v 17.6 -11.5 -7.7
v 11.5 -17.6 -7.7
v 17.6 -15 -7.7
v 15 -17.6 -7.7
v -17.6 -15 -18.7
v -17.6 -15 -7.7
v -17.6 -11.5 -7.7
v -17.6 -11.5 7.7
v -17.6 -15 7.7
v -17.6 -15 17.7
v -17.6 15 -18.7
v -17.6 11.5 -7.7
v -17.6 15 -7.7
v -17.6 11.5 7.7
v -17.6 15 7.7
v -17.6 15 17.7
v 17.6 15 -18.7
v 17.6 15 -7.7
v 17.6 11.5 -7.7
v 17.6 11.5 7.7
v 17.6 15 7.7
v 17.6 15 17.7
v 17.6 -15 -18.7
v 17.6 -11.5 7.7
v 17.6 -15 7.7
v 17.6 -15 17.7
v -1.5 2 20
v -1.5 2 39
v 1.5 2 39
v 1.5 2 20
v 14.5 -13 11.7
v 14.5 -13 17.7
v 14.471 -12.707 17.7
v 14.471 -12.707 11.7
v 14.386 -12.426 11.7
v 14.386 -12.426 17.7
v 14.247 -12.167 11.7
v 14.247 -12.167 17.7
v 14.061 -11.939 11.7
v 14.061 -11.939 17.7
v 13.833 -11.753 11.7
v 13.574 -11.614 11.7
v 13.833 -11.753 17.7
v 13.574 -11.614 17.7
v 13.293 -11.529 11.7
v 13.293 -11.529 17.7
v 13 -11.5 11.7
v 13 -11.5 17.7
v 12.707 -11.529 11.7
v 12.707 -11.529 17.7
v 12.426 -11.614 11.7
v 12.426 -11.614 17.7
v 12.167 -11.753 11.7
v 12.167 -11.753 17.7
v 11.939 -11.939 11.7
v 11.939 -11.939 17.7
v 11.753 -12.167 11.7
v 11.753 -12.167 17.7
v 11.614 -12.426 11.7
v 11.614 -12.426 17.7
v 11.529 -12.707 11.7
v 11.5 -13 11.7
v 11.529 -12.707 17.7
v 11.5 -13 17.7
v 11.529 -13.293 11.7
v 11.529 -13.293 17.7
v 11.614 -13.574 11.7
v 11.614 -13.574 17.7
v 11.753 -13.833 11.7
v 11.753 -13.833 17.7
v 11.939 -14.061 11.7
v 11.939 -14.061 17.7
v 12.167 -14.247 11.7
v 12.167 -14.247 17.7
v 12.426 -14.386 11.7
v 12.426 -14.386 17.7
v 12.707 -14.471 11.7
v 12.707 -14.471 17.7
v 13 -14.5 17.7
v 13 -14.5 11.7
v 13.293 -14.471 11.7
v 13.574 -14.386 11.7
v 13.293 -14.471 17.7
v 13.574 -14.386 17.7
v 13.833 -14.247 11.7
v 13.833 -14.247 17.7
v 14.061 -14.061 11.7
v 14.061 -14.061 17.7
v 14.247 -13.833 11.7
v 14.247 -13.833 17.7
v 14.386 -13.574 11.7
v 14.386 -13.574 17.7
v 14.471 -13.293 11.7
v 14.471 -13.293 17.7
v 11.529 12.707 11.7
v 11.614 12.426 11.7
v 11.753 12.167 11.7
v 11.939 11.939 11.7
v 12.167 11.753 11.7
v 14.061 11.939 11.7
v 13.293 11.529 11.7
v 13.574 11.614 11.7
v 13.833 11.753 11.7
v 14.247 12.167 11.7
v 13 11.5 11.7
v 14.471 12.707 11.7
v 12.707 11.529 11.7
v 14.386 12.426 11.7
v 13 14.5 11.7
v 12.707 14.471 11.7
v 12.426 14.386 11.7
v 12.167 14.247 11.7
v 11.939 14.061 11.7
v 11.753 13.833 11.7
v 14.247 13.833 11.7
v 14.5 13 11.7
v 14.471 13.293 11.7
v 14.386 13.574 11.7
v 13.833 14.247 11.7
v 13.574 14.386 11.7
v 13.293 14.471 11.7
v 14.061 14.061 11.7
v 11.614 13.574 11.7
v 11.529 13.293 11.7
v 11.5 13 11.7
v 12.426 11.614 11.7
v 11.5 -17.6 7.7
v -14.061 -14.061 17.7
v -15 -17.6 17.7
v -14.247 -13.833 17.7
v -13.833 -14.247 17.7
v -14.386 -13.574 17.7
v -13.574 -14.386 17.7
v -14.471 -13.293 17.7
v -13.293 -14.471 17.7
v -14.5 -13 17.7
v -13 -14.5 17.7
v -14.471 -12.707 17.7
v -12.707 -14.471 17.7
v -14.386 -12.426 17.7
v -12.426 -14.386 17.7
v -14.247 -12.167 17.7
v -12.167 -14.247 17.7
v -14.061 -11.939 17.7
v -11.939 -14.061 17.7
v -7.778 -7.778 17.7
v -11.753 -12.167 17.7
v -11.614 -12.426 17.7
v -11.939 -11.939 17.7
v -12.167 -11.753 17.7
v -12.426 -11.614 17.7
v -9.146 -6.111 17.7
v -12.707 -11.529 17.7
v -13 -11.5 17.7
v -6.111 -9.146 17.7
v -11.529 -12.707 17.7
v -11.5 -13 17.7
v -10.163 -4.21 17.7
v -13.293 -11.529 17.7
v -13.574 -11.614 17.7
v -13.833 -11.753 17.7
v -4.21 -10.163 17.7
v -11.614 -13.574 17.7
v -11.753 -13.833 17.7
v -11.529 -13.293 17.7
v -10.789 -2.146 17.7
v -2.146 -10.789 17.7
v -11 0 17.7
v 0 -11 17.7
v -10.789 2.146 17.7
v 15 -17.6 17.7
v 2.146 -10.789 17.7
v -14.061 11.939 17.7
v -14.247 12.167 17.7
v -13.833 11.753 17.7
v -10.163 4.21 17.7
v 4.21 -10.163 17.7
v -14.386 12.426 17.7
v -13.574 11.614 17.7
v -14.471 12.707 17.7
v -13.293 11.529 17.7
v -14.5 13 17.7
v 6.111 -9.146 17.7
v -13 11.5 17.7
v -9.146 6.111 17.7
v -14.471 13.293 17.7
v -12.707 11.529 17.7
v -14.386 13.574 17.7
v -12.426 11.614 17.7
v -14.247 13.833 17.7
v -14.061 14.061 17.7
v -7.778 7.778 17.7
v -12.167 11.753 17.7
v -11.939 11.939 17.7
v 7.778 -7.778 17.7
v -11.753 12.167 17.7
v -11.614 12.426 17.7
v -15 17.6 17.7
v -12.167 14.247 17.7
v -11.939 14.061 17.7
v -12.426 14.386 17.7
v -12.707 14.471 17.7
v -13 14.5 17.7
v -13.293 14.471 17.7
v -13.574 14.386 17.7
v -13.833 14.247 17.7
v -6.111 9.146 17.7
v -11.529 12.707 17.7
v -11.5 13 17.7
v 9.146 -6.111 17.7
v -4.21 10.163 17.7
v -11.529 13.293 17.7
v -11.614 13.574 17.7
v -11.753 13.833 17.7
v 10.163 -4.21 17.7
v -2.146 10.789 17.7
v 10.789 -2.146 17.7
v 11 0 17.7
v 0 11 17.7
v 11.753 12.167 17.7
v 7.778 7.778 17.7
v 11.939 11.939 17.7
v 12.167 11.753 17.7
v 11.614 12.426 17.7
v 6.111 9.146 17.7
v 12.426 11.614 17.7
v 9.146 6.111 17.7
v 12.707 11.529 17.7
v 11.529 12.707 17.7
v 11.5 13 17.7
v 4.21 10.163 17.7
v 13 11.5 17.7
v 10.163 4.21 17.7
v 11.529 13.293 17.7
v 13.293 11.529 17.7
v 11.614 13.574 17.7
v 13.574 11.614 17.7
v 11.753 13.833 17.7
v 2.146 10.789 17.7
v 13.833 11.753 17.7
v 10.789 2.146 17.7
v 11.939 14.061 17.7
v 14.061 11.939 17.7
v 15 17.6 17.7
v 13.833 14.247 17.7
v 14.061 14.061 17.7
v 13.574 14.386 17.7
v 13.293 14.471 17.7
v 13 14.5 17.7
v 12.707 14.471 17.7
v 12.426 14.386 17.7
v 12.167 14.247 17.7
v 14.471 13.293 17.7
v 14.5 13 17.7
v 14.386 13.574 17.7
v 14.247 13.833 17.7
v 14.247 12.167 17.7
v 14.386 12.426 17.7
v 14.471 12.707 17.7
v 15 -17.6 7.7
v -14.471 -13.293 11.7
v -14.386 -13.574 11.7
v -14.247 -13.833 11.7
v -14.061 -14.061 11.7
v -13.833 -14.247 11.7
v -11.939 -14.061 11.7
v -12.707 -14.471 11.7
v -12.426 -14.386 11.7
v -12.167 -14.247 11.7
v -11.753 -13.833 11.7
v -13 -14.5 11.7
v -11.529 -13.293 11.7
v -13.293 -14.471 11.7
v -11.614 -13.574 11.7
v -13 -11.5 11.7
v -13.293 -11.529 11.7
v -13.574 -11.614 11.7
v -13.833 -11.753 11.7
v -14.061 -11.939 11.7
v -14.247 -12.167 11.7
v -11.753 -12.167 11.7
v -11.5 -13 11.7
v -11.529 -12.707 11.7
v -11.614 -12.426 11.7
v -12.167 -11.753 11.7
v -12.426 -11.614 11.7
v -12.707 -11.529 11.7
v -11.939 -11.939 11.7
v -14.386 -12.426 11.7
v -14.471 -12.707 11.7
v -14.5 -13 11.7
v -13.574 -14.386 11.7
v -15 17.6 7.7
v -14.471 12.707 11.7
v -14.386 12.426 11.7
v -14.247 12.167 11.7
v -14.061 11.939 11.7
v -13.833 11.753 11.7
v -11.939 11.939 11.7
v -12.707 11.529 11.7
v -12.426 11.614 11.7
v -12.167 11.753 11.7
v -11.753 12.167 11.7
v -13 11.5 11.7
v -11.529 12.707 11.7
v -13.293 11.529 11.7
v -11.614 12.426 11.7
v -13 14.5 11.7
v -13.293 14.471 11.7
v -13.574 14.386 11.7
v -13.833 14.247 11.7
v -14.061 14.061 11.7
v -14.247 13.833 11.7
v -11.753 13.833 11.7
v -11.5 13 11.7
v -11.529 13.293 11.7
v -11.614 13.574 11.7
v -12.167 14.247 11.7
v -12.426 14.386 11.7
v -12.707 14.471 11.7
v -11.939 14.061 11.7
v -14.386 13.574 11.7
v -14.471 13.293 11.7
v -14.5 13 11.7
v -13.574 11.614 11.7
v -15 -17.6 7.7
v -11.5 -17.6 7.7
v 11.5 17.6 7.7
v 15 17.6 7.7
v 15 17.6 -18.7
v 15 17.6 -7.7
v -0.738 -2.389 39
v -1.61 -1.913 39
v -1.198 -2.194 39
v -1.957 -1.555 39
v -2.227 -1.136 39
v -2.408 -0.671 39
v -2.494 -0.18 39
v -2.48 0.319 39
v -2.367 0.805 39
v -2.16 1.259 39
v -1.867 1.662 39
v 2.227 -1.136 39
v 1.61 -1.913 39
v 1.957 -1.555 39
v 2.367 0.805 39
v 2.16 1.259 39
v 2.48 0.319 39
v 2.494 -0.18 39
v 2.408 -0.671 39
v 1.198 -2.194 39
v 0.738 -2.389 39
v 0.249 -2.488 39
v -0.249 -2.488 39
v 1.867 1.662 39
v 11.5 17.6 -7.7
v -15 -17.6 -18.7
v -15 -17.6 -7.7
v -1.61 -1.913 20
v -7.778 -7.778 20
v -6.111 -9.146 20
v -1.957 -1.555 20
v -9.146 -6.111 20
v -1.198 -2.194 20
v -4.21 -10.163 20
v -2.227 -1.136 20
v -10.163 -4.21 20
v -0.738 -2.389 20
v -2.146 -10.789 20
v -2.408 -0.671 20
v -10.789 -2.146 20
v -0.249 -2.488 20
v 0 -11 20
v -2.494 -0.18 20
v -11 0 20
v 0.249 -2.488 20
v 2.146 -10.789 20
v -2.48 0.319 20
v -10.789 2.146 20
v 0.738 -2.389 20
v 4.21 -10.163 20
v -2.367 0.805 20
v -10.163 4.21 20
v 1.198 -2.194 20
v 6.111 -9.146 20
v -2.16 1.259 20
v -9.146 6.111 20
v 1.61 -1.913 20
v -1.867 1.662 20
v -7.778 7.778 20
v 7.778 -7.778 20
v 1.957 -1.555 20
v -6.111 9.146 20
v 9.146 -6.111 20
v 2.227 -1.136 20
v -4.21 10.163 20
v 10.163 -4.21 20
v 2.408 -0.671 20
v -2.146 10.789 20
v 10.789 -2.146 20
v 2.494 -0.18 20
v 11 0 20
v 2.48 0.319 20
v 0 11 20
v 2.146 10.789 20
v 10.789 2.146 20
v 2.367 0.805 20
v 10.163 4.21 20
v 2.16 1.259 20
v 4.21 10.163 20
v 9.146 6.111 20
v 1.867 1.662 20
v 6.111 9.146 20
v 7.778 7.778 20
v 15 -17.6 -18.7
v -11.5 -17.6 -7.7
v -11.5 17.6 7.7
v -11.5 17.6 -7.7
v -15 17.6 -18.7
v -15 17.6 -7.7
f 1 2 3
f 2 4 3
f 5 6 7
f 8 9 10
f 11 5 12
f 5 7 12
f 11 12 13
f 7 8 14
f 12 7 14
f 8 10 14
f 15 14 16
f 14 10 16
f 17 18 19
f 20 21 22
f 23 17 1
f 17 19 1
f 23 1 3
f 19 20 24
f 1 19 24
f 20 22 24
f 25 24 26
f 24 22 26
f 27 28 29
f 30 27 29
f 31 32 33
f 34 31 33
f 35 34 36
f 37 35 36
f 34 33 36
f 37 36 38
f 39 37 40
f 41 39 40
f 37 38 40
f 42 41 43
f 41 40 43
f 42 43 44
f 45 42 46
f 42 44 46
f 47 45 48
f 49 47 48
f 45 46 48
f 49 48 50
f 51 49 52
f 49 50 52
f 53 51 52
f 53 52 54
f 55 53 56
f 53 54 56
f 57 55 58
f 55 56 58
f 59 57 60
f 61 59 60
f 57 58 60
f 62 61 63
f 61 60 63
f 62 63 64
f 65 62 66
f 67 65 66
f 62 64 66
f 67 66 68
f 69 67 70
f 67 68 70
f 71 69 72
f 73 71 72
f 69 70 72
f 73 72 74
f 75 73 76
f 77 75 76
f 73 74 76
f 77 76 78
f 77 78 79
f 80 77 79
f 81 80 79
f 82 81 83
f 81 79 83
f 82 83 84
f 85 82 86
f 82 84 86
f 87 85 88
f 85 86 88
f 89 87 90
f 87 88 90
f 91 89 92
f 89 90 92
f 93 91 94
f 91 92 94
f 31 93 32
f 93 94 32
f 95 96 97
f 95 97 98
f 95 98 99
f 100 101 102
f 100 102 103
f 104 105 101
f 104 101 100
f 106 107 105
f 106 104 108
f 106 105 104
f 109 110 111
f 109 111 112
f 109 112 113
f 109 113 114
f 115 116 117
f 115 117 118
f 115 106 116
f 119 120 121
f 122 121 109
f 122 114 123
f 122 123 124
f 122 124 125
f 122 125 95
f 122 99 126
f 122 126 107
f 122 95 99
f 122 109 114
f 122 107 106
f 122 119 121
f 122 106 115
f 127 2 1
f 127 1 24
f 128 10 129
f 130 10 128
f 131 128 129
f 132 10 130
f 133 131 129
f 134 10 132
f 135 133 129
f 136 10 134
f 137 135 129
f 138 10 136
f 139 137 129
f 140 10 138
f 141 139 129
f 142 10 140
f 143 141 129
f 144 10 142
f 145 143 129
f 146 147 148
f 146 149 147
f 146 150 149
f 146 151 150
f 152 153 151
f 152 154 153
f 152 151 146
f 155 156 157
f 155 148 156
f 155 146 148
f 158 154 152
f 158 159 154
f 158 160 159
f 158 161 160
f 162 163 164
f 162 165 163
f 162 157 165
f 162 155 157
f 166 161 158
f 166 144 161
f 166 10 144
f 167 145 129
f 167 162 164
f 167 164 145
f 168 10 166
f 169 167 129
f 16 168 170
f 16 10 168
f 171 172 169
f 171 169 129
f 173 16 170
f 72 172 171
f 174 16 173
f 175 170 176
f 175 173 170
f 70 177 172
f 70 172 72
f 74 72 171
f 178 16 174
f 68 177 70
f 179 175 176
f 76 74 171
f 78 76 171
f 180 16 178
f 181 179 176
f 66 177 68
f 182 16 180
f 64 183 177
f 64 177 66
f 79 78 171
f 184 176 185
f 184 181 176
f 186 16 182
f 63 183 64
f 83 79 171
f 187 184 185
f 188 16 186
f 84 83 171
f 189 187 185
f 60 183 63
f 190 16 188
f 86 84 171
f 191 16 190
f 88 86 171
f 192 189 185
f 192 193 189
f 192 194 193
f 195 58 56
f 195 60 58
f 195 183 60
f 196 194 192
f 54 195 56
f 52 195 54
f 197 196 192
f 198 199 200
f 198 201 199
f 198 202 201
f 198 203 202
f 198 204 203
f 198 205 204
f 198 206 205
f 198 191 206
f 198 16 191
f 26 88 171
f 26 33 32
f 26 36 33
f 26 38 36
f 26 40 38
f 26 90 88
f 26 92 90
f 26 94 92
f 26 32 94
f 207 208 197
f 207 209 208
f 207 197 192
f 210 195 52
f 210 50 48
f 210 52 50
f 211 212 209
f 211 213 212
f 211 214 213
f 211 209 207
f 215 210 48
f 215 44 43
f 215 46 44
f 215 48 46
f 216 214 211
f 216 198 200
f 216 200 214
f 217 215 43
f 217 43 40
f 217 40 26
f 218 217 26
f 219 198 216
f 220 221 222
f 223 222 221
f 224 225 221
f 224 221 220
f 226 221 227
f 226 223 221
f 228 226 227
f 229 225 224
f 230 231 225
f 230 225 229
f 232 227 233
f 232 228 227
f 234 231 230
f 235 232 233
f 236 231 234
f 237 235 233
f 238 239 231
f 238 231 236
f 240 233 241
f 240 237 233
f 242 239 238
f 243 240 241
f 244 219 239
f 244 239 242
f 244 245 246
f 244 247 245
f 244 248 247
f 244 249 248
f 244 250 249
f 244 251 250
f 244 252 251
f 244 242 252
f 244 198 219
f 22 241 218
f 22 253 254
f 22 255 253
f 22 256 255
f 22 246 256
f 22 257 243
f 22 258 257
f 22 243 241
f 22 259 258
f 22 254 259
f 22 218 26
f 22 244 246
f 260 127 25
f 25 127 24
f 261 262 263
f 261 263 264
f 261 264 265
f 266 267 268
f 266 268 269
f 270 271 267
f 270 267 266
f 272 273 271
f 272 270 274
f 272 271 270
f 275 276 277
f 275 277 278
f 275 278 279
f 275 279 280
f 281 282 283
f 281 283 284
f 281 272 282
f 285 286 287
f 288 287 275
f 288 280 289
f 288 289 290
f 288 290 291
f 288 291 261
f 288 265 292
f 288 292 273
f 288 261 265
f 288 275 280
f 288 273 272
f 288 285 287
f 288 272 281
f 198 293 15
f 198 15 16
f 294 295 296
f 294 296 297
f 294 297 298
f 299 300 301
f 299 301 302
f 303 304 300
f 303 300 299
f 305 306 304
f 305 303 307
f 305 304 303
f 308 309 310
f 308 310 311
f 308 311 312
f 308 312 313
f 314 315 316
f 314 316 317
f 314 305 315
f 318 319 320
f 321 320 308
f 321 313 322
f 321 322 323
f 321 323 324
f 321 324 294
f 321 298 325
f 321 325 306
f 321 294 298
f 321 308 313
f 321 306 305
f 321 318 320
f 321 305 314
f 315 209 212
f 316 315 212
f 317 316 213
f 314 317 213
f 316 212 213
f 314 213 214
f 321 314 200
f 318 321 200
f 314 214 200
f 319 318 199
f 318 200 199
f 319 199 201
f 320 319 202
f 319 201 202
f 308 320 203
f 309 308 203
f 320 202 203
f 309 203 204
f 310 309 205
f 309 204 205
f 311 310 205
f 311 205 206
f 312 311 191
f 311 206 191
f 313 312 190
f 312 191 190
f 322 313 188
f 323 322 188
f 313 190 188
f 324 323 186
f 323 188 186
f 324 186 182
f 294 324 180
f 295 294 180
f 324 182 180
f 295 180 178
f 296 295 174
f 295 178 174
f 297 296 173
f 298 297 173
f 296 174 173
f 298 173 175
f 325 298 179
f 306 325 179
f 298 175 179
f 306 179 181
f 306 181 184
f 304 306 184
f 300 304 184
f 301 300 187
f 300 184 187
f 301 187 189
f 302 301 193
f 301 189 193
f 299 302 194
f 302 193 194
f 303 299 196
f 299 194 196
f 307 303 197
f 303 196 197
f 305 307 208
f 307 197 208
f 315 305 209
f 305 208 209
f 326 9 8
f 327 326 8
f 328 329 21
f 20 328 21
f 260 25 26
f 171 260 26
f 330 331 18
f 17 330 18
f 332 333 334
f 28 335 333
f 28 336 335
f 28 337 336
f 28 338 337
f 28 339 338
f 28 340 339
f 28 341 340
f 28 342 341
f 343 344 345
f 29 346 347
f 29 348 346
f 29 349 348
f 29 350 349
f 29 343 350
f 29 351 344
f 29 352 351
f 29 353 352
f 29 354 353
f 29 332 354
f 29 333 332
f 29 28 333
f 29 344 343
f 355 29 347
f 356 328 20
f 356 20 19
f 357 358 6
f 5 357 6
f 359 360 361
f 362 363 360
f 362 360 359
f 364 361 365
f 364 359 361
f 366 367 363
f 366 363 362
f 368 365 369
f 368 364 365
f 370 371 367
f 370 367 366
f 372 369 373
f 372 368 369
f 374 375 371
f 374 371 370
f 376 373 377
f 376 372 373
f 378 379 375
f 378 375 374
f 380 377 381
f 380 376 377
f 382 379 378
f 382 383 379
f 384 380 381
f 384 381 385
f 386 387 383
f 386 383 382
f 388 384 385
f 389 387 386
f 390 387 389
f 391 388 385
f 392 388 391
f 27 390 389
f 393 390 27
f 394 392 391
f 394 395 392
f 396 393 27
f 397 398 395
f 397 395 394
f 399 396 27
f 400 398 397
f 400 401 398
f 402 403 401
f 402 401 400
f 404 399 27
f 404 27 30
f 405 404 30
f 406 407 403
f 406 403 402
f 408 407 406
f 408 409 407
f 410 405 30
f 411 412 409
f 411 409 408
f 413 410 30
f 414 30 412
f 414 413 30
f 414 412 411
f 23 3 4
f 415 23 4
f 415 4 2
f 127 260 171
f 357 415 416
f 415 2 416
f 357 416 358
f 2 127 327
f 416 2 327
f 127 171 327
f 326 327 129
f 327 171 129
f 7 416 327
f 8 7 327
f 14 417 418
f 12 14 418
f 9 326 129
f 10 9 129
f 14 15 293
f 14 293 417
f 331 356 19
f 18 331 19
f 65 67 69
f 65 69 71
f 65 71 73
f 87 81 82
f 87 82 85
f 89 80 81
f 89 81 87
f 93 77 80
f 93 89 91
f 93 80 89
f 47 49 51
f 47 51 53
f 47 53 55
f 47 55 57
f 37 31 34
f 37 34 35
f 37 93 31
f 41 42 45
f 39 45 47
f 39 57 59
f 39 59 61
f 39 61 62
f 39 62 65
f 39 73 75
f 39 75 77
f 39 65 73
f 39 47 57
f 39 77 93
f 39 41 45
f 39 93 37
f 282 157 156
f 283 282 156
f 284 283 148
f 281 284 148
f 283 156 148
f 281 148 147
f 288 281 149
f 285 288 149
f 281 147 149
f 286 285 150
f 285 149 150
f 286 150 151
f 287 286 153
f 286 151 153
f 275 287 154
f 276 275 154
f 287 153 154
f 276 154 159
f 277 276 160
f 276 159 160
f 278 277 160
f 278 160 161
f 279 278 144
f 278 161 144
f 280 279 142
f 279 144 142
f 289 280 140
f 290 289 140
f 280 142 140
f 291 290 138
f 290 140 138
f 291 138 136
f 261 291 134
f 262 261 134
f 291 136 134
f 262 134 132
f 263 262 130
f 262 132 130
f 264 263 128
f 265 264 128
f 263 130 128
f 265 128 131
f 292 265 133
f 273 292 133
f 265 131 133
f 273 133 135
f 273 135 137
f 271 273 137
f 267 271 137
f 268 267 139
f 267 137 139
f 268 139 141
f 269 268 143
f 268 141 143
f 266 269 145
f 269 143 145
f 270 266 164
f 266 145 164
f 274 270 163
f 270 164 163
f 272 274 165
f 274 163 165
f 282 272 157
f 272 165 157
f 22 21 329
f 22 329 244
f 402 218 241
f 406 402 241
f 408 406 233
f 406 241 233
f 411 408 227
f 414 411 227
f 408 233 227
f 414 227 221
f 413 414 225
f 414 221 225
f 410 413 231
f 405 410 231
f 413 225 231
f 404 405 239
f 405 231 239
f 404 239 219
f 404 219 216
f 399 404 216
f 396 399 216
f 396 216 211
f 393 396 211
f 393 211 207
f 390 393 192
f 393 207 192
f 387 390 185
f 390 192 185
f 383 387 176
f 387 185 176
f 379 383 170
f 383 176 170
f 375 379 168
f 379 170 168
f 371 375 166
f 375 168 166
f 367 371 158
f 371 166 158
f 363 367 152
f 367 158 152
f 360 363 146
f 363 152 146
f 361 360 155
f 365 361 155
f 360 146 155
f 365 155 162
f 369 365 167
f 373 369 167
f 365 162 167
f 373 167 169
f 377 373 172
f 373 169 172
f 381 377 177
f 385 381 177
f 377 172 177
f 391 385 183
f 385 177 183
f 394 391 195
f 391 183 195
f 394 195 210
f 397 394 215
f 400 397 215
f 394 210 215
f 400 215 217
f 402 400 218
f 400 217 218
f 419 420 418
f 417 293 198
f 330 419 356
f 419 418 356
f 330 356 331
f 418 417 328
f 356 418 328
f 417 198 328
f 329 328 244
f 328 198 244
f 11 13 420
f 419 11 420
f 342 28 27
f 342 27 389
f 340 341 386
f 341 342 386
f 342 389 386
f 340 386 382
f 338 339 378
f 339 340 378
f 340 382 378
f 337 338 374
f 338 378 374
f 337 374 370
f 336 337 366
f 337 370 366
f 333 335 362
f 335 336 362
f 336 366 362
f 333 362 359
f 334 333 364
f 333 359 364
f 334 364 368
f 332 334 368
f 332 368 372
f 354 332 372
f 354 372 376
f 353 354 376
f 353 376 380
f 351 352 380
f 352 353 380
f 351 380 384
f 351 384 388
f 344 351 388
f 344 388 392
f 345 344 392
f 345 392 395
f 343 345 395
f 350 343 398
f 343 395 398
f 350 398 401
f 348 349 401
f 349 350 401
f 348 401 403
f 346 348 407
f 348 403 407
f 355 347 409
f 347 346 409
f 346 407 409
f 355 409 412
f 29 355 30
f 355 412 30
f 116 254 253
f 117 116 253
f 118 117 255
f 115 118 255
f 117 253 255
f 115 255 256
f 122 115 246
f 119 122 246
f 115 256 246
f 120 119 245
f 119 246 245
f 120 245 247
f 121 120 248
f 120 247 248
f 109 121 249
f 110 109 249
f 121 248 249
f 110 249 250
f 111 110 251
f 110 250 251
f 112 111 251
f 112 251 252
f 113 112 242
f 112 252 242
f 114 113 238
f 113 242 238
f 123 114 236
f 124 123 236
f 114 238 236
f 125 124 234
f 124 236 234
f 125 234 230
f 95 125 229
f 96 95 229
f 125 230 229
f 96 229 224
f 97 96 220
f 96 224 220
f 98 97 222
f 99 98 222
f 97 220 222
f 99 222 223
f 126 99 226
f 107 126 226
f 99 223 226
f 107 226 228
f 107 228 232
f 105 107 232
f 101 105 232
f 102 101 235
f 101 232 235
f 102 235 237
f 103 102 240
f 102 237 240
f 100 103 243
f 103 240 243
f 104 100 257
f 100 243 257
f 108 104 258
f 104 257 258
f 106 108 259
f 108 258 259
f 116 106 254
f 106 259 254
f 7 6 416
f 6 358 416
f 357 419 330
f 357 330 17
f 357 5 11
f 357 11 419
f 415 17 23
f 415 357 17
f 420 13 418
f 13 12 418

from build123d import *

# Parameters (mm, degrees)
F0_W      = 35.2
F0_H      = 35.2
F1_DEPTH  = 7.7
F2_SIZE   = 6.1
F3_W      = 35.2
F3_H      = 35.2
F4_DEPTH  = 10
F5_SIZE   = 2.6
F7_DEPTH  = 11
F8_R      = 11
F9_DEPTH  = 2.3
F10_R     = 2.5
F11_DEPTH = 19
F12_W     = 5.253729
F12_H     = 0.933404
F13_DEPTH = 19
F14_R     = 1.5
F15_DEPTH = 6


with BuildPart() as f1:
    # F0 (on Top) → F1 (new body, symmetric)
    with BuildSketch(Plane.XY):
        Rectangle(F0_W, F0_H)
    extrude(amount=F1_DEPTH, both=True)

    # F2
    f2_edges = [f1.edges().sort_by_distance(p)[0] for p in [
        (-17.6, -17.6, 0),
        (17.6, -17.6, 0),
        (17.6, 17.6, 0),
        (-17.6, 17.6, 0),
    ]]
    chamfer(f2_edges, length=F2_SIZE)

    # F3 (on face) → F4 (join)
    with BuildSketch(Plane.XY.offset(7.7)):
        Rectangle(F3_W, F3_H)
    extrude(amount=F4_DEPTH)

    # F5
    f5_edges = [f1.edges().sort_by_distance(p)[0] for p in [
        (-17.6, -17.6, 12.7),
        (17.6, -17.6, 12.7),
        (17.6, 17.6, 12.7),
        (-17.6, 17.6, 12.7),
    ]]
    chamfer(f5_edges, length=F5_SIZE)

    # F6 (on face) → F7 (join)
    with BuildSketch(Plane(origin=(0, 0, -7.7), x_dir=(1, 0, 0), z_dir=(0, 0, -1))):
        Polygon((-15, -17.6), (15, -17.6), (17.6, -15), (17.6, 15), (15, 17.6), (-15, 17.6), (-17.6, 15), (-17.6, -15), align=None)
    extrude(amount=F7_DEPTH)

    # F8 (on face) → F9 (join)
    with BuildSketch(Plane.XY.offset(17.7)):
        Circle(F8_R)
    extrude(amount=F9_DEPTH)

    # F10 (on face) → F11 (join)
    with BuildSketch(Plane.XY.offset(20)):
        Circle(F10_R)
    extrude(amount=F11_DEPTH)

    # F12 (on face) → F13 (cut)
    with BuildSketch(Plane.XY.offset(39)):
        with Locations((-0.006502, 2.466702)):
            Rectangle(F12_W, F12_H)
    extrude(amount=-F13_DEPTH, mode=Mode.SUBTRACT)

    # F14 (on face) → F15 (cut)
    with BuildSketch(Plane.XY.offset(17.7)):
        with Locations((-13, 13)):
            Circle(F14_R)
        with Locations((13, 13)):
            Circle(F14_R)
        with Locations((-13, -13)):
            Circle(F14_R)
        with Locations((13, -13)):
            Circle(F14_R)
    extrude(amount=-F15_DEPTH, mode=Mode.SUBTRACT)


solid = f1.part
